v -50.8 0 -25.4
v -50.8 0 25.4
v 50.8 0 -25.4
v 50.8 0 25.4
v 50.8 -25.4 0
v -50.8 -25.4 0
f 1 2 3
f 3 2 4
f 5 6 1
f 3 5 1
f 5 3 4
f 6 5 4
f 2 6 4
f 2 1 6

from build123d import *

# Parameters (mm, degrees)
F0_W     = 101.6
F0_H     = 50.8
F1_DEPTH = 25.4
F4_DEPTH = 101.6
F5_DEPTH = 101.6


with BuildPart() as f1:
    # F0 (on Front) → F1 (new body)
    with BuildSketch(Plane.XZ):
        Rectangle(F0_W, F0_H)
    extrude(amount=F1_DEPTH)

    # F2 (on face) → F4 (cut)
    with BuildSketch(Plane.YZ.offset(50.8)):
        Polygon((-25.4, 25.4), (-25.4, 0), (0, 25.4), align=None)
    extrude(amount=-F4_DEPTH, mode=Mode.SUBTRACT)

    # F3 (on face) → F5 (cut)
    with BuildSketch(Plane(origin=(-50.8, 0, 0), x_dir=(0, -1, 0), z_dir=(-1, 0, 0))):
        Polygon((25.4, -25.4), (25.4, 0), (0, -25.4), align=None)
    extrude(amount=-F5_DEPTH, mode=Mode.SUBTRACT)


solid = f1.part
